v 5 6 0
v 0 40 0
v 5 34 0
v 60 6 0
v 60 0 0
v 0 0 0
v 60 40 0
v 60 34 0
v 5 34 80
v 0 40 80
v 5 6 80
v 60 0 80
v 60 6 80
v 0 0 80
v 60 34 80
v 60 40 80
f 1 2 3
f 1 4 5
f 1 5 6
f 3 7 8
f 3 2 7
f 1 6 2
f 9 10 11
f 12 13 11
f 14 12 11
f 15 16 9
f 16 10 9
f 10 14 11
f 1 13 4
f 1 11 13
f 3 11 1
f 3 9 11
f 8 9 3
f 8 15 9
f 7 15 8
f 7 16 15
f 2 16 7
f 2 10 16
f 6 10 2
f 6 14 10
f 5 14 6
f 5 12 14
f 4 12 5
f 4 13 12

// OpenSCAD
$fn = 32;

// ----------------------------------------------------------------------
// Structural section: channel 60 x 40 mm
// ----------------------------------------------------------------------

// --- parameters (mm) ---
sec_w = 60;               // channel width, X
sec_h = 40;               // channel height, Y
flange_t = 6;             // flange thickness
web_t = 5;                // web thickness
plate_t = 80;             // cut length, Z (extrusion height)

profile = [[0, 0], [60, 0], [60, 6], [5, 6], [5, 34], [60, 34], [60, 40], [0, 40]];  // primary outline, 8 points, counter clockwise

// --- the one profile operation ---
linear_extrude(height = plate_t) polygon(points = profile);
